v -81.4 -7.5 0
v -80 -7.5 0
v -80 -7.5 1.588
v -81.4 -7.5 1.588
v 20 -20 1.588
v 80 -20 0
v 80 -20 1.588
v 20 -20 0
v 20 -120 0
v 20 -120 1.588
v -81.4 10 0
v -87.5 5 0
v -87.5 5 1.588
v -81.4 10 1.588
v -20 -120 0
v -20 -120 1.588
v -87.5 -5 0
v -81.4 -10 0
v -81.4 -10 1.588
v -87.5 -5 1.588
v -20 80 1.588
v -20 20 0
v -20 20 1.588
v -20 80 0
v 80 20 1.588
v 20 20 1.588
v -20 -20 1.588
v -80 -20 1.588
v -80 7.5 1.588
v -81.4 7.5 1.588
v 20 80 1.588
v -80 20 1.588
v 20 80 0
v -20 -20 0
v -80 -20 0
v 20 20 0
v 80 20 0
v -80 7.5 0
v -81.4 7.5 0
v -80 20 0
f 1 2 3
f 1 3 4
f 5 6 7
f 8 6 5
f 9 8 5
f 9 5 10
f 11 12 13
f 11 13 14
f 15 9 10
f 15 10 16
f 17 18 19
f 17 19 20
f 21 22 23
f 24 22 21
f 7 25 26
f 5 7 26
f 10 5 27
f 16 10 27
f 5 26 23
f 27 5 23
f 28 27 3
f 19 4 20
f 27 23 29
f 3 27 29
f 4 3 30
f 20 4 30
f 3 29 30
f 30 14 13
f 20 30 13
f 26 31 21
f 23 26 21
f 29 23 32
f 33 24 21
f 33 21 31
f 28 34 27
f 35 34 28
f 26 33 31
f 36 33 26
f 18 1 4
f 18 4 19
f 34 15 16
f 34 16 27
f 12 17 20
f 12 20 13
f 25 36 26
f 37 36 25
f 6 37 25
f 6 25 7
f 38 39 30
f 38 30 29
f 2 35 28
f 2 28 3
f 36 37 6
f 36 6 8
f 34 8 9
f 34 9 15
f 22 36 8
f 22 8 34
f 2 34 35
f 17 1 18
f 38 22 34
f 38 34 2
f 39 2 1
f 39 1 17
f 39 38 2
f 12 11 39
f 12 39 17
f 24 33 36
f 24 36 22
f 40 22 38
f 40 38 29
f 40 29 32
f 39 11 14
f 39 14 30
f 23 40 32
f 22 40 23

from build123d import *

# Parameters (mm, degrees)
BOSS_EXTRUDE1_DEPTH = 1.5875
BOSS_EXTRUDE2_DEPTH = 1.5875


with BuildPart() as part:
    # Sketch1 → Boss-Extrude1 (new body)
    with BuildSketch(Plane.XY):
        Polygon((-20, 20), (-20, 80), (20, 80), (20, 20), (80, 20), (80, -20), (20, -20), (20, -120), (-20, -120), (-20, -20), (-80, -20), (-80, 20), align=None)
    extrude(amount=BOSS_EXTRUDE1_DEPTH)

    # Sketch13 → Boss-Extrude2 (add)
    with BuildSketch(Plane.XY):
        Polygon((-80, 7.5), (-80, -7.5), (-81.4, -7.5), (-81.4, -10), (-87.5, -5), (-87.5, 5), (-81.4, 10), (-81.4, 7.5), align=None)
    extrude(amount=BOSS_EXTRUDE2_DEPTH)


solid = part.part
